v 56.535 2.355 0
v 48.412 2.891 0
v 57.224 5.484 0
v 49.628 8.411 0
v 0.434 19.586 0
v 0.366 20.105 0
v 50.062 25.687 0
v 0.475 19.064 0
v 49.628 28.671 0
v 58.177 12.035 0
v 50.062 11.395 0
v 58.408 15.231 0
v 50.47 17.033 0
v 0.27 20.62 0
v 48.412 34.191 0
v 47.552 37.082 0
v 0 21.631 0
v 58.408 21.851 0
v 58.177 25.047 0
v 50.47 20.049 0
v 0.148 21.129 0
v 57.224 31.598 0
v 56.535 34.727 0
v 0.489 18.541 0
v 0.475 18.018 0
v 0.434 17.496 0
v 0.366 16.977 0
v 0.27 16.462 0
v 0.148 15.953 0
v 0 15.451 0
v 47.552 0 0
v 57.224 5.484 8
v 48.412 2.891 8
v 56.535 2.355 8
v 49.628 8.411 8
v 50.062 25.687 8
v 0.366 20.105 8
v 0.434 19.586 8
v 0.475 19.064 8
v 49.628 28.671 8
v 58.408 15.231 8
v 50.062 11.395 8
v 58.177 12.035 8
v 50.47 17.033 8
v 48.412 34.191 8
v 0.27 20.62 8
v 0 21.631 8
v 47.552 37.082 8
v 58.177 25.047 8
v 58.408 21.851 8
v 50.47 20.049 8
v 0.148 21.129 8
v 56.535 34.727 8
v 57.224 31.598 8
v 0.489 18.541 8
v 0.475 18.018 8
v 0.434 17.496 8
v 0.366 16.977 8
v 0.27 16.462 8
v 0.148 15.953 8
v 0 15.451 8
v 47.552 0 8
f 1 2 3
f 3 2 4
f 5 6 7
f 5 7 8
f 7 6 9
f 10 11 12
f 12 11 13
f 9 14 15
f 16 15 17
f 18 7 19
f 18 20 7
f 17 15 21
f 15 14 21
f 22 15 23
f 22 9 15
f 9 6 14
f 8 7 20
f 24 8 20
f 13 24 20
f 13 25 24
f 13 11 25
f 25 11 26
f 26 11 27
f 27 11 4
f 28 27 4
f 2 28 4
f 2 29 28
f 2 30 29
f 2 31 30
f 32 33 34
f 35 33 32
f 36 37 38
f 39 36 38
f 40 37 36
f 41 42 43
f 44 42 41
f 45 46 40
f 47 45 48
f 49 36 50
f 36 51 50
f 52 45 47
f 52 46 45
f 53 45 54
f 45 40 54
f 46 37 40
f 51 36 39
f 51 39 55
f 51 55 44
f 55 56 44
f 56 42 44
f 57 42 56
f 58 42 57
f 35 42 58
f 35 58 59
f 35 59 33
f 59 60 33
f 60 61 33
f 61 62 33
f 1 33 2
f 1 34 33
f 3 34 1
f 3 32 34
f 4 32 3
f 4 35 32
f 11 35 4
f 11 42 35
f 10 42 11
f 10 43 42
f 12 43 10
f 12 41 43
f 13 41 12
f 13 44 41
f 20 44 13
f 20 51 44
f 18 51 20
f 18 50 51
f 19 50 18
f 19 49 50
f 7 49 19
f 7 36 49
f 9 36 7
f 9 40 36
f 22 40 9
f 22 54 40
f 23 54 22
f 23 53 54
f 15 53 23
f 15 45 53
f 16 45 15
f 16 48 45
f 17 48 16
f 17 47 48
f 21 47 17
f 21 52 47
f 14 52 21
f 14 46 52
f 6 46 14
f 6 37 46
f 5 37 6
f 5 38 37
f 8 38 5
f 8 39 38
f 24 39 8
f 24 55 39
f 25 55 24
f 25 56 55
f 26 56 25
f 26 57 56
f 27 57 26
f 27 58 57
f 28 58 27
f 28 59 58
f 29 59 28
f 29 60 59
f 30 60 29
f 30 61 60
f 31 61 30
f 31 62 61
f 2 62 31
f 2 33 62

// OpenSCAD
$fn = 32;

// ----------------------------------------------------------------------
// Gear sector: 4 teeth on 36 degrees
// ----------------------------------------------------------------------

// --- parameters (mm) ---
sector_angle = 36;        // sector angle, degrees
root_r = 60;              // root circle radius
tooth_h = 8;              // tooth height over the root circle
teeth = 4;                // number of teeth on the sector
hub_r = 10;               // hub bore radius
plate_t = 8;              // sector thickness, Z
arc_step = 3;             // sampling step of the root/hub arcs, degrees

tip_r = root_r + tooth_h;  // tip circle radius

profile = [[47.552, 0], [48.412, 2.891], [56.535, 2.355], [57.224, 5.484], [49.628, 8.411], [50.062, 11.395], [58.177, 12.035], [58.408, 15.231], [50.47, 17.033], [50.47, 20.049], [58.408, 21.851], [58.177, 25.047], [50.062, 25.687], [49.628, 28.671], [57.224, 31.598], [56.535, 34.727], [48.412, 34.191], [47.552, 37.082], [0, 21.631], [0.148, 21.129], [0.27, 20.62], [0.366, 20.105], [0.434, 19.586], [0.475, 19.064], [0.489, 18.541], [0.475, 18.018], [0.434, 17.496], [0.366, 16.977], [0.27, 16.462], [0.148, 15.953], [0, 15.451]];  // primary outline, 31 points, counter clockwise

// --- the one profile operation ---
linear_extrude(height = plate_t) polygon(points = profile);
